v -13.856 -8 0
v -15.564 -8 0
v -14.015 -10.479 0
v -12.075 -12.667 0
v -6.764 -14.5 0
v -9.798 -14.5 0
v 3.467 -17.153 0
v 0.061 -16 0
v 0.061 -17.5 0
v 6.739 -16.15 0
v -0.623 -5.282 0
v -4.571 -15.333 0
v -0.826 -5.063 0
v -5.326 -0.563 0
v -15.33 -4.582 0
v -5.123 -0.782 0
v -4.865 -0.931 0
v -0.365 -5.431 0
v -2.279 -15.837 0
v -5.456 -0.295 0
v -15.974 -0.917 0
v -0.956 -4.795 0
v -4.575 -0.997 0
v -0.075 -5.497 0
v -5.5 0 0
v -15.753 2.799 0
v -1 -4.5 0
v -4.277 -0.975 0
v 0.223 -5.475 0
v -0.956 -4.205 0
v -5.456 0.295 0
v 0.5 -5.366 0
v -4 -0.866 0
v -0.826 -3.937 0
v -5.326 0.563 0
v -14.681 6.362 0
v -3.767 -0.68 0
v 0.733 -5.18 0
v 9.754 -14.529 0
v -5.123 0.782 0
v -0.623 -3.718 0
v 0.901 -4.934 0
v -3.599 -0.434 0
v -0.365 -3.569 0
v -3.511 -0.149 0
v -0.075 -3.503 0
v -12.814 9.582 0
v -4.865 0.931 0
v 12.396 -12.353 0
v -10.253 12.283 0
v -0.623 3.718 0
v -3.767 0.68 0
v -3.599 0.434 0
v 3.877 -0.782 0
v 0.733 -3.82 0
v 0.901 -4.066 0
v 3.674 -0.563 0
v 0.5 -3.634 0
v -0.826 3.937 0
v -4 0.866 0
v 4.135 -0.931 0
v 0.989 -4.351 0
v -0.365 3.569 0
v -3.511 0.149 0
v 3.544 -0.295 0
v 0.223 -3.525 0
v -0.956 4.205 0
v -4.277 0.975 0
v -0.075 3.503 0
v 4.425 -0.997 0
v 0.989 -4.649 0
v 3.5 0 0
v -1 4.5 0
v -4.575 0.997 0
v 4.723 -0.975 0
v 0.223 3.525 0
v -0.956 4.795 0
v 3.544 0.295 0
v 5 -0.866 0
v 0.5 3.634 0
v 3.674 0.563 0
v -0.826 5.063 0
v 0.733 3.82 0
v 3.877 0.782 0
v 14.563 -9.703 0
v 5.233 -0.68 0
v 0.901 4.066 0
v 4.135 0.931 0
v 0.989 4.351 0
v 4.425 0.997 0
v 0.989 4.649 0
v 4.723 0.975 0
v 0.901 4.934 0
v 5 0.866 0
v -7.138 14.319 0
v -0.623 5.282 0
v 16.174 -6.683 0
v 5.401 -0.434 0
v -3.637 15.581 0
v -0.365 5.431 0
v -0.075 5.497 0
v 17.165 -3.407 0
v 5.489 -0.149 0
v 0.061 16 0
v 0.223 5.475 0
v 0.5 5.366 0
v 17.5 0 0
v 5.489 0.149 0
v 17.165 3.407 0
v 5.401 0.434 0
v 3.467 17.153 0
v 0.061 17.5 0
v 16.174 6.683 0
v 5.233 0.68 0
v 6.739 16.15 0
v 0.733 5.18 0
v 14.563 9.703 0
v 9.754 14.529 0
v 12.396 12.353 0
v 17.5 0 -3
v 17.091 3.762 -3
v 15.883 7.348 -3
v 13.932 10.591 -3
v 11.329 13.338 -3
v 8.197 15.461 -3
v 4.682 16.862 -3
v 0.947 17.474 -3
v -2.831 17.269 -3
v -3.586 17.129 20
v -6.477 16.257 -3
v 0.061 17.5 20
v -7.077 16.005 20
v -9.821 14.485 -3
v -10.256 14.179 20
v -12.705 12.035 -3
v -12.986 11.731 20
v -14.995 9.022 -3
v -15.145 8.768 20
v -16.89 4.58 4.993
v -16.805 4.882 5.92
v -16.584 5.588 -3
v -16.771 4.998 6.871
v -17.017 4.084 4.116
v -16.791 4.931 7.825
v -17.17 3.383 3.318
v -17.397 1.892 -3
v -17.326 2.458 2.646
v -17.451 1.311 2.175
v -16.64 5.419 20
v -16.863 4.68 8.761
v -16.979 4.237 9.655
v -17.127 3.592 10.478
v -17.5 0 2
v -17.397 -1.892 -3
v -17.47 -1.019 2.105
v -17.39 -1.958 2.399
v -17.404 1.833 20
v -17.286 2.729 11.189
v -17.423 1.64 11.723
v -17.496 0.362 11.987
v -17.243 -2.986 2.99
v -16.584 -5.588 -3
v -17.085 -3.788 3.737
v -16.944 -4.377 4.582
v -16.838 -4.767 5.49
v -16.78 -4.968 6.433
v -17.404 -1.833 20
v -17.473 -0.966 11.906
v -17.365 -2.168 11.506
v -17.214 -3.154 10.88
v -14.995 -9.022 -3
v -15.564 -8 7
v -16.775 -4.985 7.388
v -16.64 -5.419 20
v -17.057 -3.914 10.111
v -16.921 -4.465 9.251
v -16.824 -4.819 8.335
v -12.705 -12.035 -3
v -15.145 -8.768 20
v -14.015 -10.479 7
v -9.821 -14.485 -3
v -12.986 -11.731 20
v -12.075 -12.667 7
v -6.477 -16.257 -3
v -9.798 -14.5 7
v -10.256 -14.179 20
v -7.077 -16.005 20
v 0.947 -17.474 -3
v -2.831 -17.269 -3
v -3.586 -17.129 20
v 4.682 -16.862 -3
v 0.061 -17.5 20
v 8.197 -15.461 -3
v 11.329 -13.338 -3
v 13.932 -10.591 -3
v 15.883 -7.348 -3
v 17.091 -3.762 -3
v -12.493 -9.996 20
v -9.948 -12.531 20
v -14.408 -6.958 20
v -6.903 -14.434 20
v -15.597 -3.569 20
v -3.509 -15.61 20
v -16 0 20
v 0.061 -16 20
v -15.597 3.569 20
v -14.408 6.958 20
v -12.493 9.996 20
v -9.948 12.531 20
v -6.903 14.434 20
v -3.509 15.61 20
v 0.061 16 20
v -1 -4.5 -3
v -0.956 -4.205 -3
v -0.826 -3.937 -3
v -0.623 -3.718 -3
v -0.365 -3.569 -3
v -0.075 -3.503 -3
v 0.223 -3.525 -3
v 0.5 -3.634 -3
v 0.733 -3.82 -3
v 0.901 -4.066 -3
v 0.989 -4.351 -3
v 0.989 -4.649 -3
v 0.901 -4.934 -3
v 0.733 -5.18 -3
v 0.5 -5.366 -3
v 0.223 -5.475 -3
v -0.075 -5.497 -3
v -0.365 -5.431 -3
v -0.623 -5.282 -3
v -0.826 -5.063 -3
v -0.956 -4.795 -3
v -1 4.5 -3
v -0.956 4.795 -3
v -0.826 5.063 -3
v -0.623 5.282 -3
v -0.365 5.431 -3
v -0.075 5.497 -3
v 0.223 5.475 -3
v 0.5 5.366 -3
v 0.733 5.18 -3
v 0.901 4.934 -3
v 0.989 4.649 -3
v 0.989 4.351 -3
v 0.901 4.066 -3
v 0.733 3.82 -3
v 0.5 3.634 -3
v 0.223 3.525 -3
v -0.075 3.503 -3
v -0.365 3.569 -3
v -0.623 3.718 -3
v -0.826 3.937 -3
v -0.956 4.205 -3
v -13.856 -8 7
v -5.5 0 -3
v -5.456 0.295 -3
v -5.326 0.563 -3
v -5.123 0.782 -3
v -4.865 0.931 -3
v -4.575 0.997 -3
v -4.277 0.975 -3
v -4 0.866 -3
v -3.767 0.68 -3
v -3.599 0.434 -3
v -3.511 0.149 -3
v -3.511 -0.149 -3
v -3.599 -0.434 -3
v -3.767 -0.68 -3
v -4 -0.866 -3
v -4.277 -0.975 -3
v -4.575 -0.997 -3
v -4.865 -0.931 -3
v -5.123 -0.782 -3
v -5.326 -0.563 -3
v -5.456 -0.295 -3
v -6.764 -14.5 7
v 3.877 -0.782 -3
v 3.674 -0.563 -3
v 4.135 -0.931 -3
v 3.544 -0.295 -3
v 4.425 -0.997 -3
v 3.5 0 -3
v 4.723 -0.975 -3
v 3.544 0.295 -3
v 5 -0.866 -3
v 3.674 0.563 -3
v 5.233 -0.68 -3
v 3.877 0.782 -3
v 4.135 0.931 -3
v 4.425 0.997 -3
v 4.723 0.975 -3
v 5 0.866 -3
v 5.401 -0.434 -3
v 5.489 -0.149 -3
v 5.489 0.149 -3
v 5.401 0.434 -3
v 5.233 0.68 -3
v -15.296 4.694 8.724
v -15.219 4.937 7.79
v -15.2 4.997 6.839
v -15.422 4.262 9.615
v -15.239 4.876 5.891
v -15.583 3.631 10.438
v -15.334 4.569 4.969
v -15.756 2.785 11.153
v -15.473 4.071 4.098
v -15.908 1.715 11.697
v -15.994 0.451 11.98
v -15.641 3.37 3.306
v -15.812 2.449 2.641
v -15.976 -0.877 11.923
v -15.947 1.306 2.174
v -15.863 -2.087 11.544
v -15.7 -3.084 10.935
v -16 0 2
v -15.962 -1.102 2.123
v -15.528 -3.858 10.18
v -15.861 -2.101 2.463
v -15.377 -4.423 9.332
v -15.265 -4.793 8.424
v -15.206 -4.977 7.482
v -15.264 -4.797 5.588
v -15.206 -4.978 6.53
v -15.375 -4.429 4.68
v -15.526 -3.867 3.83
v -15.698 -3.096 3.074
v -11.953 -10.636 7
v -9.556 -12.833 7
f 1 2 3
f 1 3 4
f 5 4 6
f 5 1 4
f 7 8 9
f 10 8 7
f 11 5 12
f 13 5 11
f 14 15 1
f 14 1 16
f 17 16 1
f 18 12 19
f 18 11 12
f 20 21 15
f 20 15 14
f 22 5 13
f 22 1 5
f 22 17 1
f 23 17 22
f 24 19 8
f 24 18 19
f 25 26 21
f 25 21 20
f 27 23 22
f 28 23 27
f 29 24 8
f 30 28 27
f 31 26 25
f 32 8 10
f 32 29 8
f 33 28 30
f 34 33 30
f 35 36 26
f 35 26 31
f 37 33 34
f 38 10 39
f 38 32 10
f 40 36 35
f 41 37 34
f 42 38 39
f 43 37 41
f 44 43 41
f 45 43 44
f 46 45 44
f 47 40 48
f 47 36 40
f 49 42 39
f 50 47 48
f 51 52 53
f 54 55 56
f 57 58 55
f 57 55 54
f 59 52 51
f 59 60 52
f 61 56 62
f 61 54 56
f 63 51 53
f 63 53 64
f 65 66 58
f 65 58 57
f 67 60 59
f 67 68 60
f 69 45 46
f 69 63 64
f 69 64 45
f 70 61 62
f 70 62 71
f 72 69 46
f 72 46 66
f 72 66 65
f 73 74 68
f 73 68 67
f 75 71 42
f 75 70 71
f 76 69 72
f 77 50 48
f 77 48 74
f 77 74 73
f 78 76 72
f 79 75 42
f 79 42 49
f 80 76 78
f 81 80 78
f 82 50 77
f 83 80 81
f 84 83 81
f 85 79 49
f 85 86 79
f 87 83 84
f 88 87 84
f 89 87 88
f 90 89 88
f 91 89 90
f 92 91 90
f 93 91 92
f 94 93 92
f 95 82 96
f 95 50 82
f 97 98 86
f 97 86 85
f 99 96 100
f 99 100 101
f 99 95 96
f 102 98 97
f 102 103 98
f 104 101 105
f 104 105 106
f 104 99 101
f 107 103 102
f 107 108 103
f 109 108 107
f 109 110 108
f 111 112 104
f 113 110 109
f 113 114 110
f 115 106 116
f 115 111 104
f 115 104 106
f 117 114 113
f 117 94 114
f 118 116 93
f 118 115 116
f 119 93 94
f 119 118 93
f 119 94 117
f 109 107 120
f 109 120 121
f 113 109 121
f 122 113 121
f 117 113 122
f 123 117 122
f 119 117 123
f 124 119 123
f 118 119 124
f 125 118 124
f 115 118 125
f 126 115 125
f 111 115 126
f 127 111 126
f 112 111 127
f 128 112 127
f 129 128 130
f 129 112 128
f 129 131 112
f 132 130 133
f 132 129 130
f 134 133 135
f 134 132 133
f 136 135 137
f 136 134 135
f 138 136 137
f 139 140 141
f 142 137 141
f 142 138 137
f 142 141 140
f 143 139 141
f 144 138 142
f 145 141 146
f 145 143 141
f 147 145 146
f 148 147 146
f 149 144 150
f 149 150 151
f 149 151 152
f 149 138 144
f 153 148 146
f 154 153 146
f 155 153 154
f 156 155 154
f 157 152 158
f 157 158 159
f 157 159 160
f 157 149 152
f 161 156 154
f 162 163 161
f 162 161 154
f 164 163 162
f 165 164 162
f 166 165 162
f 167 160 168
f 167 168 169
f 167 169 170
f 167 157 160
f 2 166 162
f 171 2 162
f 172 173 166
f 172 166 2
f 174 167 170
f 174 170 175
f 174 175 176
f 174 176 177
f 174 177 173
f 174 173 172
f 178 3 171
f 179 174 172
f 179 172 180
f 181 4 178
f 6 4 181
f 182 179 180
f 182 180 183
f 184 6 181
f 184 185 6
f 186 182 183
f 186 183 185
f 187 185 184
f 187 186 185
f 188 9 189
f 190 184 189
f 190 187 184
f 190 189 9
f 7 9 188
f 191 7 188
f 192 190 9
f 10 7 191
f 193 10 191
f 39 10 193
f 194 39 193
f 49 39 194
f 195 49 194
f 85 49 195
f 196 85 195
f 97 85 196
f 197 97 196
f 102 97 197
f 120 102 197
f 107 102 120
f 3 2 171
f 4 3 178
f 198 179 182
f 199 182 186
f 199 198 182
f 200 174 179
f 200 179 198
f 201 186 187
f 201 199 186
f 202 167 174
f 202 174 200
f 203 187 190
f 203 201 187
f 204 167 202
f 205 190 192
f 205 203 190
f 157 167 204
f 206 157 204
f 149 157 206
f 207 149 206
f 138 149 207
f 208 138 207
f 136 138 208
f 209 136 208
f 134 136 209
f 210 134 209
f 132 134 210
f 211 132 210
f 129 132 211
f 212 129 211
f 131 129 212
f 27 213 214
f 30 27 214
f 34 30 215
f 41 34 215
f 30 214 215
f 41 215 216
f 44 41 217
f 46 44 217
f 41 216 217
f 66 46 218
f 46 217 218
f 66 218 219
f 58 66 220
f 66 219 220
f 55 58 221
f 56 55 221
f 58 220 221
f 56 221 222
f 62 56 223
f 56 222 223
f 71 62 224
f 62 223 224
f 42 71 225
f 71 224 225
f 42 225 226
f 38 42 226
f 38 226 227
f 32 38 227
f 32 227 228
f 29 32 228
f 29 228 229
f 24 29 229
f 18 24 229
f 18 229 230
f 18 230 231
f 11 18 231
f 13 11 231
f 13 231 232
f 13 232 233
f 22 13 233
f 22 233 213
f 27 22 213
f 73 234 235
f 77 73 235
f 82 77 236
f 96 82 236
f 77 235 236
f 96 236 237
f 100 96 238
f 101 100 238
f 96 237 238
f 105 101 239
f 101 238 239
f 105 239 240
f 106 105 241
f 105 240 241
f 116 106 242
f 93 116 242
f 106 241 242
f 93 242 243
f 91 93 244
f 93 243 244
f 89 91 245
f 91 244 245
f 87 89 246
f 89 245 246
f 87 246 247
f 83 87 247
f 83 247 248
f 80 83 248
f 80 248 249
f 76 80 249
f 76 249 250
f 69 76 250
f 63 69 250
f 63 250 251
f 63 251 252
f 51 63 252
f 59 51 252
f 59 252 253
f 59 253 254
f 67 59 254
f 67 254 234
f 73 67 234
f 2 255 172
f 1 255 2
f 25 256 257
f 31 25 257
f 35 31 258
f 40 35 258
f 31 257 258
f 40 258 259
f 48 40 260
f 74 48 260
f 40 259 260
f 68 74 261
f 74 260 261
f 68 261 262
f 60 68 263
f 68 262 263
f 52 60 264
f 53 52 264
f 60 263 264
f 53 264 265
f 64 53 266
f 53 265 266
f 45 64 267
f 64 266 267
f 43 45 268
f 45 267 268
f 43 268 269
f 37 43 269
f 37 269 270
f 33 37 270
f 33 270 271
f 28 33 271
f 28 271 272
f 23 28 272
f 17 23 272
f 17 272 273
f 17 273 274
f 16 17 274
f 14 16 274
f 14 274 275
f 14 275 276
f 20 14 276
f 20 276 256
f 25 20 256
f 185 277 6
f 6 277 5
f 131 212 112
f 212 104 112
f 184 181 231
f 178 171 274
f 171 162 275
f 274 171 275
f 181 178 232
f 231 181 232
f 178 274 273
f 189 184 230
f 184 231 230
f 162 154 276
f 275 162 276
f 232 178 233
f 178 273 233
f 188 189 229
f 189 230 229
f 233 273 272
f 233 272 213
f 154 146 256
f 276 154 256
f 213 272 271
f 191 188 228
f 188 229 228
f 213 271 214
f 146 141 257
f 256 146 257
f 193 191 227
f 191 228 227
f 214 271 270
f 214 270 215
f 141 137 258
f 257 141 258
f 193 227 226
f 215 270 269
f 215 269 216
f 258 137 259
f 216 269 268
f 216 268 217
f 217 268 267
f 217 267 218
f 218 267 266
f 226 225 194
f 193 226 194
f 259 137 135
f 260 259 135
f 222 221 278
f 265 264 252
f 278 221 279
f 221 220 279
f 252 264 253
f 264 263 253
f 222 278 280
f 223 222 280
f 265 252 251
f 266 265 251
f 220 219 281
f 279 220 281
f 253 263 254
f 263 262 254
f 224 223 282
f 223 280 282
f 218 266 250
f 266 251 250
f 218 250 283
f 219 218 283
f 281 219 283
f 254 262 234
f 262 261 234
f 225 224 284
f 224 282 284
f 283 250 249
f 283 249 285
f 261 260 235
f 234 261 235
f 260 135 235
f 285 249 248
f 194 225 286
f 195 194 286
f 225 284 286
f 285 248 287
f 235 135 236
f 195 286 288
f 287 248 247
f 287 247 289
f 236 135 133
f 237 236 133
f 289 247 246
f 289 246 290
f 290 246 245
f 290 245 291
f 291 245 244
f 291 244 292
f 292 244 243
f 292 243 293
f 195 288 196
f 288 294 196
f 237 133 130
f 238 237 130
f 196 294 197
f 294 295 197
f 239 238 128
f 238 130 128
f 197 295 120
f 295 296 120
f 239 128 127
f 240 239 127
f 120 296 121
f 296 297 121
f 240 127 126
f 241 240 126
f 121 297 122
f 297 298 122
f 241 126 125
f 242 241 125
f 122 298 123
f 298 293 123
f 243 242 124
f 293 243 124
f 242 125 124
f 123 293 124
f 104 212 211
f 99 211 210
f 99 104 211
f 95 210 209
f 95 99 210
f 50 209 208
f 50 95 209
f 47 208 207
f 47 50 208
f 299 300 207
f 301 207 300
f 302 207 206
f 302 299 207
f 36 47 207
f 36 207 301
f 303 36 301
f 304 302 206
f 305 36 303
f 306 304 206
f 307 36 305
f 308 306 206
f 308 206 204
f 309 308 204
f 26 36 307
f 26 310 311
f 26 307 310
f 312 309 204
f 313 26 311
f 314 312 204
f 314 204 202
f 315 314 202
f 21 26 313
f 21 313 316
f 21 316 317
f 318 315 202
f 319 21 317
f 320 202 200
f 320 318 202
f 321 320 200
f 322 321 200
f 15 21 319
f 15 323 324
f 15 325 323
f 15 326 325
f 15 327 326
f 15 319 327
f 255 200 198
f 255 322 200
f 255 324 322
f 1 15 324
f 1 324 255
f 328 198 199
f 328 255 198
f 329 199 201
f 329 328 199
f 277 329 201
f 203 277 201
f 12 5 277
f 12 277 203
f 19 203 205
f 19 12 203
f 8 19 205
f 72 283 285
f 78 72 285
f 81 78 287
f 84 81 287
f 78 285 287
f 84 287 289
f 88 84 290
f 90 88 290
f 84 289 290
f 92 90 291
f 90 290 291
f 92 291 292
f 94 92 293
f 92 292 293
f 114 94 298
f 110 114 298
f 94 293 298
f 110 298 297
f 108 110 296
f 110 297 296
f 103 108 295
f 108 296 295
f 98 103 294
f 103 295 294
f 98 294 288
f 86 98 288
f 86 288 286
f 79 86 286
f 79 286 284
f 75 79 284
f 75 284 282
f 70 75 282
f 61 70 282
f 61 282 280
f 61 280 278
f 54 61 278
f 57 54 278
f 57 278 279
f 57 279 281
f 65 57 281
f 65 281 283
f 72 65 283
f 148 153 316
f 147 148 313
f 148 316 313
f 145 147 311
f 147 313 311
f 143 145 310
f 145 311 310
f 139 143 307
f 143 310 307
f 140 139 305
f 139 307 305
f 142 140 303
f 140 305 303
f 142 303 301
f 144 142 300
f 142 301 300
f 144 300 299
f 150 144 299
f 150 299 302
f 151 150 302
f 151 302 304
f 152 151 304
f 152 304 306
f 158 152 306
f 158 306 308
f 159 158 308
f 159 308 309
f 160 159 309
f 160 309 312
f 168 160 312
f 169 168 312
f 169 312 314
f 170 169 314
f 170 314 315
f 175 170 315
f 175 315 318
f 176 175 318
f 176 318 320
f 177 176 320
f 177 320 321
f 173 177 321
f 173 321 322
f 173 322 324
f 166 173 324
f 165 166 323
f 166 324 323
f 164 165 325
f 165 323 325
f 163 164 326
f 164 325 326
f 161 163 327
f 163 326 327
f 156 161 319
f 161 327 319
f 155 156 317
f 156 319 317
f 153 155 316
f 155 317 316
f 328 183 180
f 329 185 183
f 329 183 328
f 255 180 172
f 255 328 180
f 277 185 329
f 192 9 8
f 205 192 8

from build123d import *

# Parameters (mm, degrees)
SKIZZE3_R                       = 17.5
SKIZZE3_R_2                     = 16
AUFSATZ_LINEAR_AUSTRAGEN3_DEPTH = 20
SKIZZE4_R                       = 17.5
AUFSATZ_LINEAR_AUSTRAGEN4_DEPTH = 3
SKIZZE5_R                       = 5
SCHNITT_LINEAR_AUSTRAGEN1_DEPTH = 40
SKIZZE6_R                       = 1
SCHNITT_LINEAR_AUSTRAGEN2_DEPTH = 10
SKIZZE7_W                       = 31.87732214
SKIZZE7_H                       = 34.999785002
SCHNITT_LINEAR_AUSTRAGEN3_DEPTH = 30
SKIZZE8_W                       = 7
SKIZZE8_H                       = 6.5
SCHNITT_LINEAR_AUSTRAGEN4_DEPTH = 30


with BuildPart() as part:
    # Skizze3 → Aufsatz-Linear austragen3 (new body)
    with BuildSketch(Plane.XY):
        Circle(SKIZZE3_R)
        Circle(SKIZZE3_R_2, mode=Mode.SUBTRACT)
    extrude(amount=AUFSATZ_LINEAR_AUSTRAGEN3_DEPTH)

    # Skizze4 → Aufsatz-Linear austragen4 (add)
    with BuildSketch(Plane.XY):
        Circle(SKIZZE4_R)
    extrude(amount=-AUFSATZ_LINEAR_AUSTRAGEN4_DEPTH)

    # Skizze5 → Schnitt-Linear austragen1 (cut)
    with BuildSketch(Plane(origin=(0, 0, 0), x_dir=(0, 0, -1), z_dir=(1, 0, 0))):
        with Locations((-7, 0)):
            Circle(SKIZZE5_R)
    extrude(amount=-SCHNITT_LINEAR_AUSTRAGEN1_DEPTH, mode=Mode.SUBTRACT)

    # Skizze6 → Schnitt-Linear austragen2 (cut)
    with BuildSketch(Plane(origin=(0, 0, -3), x_dir=(-1, 0, 0), z_dir=(0, 0, -1))):
        with Locations((-4.5, 0)):
            Circle(SKIZZE6_R)
        with Locations((0, 4.5)):
            Circle(SKIZZE6_R)
        with Locations((4.5, 0)):
            Circle(SKIZZE6_R)
        with Locations((0, -4.5)):
            Circle(SKIZZE6_R)
    extrude(amount=-SCHNITT_LINEAR_AUSTRAGEN2_DEPTH, mode=Mode.SUBTRACT)

    # Skizze7 → Schnitt-Linear austragen3 (cut)
    with BuildSketch(Plane.XY):
        with Locations((16, 0)):
            Rectangle(SKIZZE7_W, SKIZZE7_H)
    extrude(amount=SCHNITT_LINEAR_AUSTRAGEN3_DEPTH, mode=Mode.SUBTRACT)

    # Skizze8 → Schnitt-Linear austragen4 (cut)
    with BuildSketch(Plane(origin=(0, 0, 0), x_dir=(0, 0, -1), z_dir=(1, 0, 0))):
        with Locations((-3.5, -11.25)):
            Rectangle(SKIZZE8_W, SKIZZE8_H)
    extrude(amount=-SCHNITT_LINEAR_AUSTRAGEN4_DEPTH, mode=Mode.SUBTRACT)


solid = part.part
